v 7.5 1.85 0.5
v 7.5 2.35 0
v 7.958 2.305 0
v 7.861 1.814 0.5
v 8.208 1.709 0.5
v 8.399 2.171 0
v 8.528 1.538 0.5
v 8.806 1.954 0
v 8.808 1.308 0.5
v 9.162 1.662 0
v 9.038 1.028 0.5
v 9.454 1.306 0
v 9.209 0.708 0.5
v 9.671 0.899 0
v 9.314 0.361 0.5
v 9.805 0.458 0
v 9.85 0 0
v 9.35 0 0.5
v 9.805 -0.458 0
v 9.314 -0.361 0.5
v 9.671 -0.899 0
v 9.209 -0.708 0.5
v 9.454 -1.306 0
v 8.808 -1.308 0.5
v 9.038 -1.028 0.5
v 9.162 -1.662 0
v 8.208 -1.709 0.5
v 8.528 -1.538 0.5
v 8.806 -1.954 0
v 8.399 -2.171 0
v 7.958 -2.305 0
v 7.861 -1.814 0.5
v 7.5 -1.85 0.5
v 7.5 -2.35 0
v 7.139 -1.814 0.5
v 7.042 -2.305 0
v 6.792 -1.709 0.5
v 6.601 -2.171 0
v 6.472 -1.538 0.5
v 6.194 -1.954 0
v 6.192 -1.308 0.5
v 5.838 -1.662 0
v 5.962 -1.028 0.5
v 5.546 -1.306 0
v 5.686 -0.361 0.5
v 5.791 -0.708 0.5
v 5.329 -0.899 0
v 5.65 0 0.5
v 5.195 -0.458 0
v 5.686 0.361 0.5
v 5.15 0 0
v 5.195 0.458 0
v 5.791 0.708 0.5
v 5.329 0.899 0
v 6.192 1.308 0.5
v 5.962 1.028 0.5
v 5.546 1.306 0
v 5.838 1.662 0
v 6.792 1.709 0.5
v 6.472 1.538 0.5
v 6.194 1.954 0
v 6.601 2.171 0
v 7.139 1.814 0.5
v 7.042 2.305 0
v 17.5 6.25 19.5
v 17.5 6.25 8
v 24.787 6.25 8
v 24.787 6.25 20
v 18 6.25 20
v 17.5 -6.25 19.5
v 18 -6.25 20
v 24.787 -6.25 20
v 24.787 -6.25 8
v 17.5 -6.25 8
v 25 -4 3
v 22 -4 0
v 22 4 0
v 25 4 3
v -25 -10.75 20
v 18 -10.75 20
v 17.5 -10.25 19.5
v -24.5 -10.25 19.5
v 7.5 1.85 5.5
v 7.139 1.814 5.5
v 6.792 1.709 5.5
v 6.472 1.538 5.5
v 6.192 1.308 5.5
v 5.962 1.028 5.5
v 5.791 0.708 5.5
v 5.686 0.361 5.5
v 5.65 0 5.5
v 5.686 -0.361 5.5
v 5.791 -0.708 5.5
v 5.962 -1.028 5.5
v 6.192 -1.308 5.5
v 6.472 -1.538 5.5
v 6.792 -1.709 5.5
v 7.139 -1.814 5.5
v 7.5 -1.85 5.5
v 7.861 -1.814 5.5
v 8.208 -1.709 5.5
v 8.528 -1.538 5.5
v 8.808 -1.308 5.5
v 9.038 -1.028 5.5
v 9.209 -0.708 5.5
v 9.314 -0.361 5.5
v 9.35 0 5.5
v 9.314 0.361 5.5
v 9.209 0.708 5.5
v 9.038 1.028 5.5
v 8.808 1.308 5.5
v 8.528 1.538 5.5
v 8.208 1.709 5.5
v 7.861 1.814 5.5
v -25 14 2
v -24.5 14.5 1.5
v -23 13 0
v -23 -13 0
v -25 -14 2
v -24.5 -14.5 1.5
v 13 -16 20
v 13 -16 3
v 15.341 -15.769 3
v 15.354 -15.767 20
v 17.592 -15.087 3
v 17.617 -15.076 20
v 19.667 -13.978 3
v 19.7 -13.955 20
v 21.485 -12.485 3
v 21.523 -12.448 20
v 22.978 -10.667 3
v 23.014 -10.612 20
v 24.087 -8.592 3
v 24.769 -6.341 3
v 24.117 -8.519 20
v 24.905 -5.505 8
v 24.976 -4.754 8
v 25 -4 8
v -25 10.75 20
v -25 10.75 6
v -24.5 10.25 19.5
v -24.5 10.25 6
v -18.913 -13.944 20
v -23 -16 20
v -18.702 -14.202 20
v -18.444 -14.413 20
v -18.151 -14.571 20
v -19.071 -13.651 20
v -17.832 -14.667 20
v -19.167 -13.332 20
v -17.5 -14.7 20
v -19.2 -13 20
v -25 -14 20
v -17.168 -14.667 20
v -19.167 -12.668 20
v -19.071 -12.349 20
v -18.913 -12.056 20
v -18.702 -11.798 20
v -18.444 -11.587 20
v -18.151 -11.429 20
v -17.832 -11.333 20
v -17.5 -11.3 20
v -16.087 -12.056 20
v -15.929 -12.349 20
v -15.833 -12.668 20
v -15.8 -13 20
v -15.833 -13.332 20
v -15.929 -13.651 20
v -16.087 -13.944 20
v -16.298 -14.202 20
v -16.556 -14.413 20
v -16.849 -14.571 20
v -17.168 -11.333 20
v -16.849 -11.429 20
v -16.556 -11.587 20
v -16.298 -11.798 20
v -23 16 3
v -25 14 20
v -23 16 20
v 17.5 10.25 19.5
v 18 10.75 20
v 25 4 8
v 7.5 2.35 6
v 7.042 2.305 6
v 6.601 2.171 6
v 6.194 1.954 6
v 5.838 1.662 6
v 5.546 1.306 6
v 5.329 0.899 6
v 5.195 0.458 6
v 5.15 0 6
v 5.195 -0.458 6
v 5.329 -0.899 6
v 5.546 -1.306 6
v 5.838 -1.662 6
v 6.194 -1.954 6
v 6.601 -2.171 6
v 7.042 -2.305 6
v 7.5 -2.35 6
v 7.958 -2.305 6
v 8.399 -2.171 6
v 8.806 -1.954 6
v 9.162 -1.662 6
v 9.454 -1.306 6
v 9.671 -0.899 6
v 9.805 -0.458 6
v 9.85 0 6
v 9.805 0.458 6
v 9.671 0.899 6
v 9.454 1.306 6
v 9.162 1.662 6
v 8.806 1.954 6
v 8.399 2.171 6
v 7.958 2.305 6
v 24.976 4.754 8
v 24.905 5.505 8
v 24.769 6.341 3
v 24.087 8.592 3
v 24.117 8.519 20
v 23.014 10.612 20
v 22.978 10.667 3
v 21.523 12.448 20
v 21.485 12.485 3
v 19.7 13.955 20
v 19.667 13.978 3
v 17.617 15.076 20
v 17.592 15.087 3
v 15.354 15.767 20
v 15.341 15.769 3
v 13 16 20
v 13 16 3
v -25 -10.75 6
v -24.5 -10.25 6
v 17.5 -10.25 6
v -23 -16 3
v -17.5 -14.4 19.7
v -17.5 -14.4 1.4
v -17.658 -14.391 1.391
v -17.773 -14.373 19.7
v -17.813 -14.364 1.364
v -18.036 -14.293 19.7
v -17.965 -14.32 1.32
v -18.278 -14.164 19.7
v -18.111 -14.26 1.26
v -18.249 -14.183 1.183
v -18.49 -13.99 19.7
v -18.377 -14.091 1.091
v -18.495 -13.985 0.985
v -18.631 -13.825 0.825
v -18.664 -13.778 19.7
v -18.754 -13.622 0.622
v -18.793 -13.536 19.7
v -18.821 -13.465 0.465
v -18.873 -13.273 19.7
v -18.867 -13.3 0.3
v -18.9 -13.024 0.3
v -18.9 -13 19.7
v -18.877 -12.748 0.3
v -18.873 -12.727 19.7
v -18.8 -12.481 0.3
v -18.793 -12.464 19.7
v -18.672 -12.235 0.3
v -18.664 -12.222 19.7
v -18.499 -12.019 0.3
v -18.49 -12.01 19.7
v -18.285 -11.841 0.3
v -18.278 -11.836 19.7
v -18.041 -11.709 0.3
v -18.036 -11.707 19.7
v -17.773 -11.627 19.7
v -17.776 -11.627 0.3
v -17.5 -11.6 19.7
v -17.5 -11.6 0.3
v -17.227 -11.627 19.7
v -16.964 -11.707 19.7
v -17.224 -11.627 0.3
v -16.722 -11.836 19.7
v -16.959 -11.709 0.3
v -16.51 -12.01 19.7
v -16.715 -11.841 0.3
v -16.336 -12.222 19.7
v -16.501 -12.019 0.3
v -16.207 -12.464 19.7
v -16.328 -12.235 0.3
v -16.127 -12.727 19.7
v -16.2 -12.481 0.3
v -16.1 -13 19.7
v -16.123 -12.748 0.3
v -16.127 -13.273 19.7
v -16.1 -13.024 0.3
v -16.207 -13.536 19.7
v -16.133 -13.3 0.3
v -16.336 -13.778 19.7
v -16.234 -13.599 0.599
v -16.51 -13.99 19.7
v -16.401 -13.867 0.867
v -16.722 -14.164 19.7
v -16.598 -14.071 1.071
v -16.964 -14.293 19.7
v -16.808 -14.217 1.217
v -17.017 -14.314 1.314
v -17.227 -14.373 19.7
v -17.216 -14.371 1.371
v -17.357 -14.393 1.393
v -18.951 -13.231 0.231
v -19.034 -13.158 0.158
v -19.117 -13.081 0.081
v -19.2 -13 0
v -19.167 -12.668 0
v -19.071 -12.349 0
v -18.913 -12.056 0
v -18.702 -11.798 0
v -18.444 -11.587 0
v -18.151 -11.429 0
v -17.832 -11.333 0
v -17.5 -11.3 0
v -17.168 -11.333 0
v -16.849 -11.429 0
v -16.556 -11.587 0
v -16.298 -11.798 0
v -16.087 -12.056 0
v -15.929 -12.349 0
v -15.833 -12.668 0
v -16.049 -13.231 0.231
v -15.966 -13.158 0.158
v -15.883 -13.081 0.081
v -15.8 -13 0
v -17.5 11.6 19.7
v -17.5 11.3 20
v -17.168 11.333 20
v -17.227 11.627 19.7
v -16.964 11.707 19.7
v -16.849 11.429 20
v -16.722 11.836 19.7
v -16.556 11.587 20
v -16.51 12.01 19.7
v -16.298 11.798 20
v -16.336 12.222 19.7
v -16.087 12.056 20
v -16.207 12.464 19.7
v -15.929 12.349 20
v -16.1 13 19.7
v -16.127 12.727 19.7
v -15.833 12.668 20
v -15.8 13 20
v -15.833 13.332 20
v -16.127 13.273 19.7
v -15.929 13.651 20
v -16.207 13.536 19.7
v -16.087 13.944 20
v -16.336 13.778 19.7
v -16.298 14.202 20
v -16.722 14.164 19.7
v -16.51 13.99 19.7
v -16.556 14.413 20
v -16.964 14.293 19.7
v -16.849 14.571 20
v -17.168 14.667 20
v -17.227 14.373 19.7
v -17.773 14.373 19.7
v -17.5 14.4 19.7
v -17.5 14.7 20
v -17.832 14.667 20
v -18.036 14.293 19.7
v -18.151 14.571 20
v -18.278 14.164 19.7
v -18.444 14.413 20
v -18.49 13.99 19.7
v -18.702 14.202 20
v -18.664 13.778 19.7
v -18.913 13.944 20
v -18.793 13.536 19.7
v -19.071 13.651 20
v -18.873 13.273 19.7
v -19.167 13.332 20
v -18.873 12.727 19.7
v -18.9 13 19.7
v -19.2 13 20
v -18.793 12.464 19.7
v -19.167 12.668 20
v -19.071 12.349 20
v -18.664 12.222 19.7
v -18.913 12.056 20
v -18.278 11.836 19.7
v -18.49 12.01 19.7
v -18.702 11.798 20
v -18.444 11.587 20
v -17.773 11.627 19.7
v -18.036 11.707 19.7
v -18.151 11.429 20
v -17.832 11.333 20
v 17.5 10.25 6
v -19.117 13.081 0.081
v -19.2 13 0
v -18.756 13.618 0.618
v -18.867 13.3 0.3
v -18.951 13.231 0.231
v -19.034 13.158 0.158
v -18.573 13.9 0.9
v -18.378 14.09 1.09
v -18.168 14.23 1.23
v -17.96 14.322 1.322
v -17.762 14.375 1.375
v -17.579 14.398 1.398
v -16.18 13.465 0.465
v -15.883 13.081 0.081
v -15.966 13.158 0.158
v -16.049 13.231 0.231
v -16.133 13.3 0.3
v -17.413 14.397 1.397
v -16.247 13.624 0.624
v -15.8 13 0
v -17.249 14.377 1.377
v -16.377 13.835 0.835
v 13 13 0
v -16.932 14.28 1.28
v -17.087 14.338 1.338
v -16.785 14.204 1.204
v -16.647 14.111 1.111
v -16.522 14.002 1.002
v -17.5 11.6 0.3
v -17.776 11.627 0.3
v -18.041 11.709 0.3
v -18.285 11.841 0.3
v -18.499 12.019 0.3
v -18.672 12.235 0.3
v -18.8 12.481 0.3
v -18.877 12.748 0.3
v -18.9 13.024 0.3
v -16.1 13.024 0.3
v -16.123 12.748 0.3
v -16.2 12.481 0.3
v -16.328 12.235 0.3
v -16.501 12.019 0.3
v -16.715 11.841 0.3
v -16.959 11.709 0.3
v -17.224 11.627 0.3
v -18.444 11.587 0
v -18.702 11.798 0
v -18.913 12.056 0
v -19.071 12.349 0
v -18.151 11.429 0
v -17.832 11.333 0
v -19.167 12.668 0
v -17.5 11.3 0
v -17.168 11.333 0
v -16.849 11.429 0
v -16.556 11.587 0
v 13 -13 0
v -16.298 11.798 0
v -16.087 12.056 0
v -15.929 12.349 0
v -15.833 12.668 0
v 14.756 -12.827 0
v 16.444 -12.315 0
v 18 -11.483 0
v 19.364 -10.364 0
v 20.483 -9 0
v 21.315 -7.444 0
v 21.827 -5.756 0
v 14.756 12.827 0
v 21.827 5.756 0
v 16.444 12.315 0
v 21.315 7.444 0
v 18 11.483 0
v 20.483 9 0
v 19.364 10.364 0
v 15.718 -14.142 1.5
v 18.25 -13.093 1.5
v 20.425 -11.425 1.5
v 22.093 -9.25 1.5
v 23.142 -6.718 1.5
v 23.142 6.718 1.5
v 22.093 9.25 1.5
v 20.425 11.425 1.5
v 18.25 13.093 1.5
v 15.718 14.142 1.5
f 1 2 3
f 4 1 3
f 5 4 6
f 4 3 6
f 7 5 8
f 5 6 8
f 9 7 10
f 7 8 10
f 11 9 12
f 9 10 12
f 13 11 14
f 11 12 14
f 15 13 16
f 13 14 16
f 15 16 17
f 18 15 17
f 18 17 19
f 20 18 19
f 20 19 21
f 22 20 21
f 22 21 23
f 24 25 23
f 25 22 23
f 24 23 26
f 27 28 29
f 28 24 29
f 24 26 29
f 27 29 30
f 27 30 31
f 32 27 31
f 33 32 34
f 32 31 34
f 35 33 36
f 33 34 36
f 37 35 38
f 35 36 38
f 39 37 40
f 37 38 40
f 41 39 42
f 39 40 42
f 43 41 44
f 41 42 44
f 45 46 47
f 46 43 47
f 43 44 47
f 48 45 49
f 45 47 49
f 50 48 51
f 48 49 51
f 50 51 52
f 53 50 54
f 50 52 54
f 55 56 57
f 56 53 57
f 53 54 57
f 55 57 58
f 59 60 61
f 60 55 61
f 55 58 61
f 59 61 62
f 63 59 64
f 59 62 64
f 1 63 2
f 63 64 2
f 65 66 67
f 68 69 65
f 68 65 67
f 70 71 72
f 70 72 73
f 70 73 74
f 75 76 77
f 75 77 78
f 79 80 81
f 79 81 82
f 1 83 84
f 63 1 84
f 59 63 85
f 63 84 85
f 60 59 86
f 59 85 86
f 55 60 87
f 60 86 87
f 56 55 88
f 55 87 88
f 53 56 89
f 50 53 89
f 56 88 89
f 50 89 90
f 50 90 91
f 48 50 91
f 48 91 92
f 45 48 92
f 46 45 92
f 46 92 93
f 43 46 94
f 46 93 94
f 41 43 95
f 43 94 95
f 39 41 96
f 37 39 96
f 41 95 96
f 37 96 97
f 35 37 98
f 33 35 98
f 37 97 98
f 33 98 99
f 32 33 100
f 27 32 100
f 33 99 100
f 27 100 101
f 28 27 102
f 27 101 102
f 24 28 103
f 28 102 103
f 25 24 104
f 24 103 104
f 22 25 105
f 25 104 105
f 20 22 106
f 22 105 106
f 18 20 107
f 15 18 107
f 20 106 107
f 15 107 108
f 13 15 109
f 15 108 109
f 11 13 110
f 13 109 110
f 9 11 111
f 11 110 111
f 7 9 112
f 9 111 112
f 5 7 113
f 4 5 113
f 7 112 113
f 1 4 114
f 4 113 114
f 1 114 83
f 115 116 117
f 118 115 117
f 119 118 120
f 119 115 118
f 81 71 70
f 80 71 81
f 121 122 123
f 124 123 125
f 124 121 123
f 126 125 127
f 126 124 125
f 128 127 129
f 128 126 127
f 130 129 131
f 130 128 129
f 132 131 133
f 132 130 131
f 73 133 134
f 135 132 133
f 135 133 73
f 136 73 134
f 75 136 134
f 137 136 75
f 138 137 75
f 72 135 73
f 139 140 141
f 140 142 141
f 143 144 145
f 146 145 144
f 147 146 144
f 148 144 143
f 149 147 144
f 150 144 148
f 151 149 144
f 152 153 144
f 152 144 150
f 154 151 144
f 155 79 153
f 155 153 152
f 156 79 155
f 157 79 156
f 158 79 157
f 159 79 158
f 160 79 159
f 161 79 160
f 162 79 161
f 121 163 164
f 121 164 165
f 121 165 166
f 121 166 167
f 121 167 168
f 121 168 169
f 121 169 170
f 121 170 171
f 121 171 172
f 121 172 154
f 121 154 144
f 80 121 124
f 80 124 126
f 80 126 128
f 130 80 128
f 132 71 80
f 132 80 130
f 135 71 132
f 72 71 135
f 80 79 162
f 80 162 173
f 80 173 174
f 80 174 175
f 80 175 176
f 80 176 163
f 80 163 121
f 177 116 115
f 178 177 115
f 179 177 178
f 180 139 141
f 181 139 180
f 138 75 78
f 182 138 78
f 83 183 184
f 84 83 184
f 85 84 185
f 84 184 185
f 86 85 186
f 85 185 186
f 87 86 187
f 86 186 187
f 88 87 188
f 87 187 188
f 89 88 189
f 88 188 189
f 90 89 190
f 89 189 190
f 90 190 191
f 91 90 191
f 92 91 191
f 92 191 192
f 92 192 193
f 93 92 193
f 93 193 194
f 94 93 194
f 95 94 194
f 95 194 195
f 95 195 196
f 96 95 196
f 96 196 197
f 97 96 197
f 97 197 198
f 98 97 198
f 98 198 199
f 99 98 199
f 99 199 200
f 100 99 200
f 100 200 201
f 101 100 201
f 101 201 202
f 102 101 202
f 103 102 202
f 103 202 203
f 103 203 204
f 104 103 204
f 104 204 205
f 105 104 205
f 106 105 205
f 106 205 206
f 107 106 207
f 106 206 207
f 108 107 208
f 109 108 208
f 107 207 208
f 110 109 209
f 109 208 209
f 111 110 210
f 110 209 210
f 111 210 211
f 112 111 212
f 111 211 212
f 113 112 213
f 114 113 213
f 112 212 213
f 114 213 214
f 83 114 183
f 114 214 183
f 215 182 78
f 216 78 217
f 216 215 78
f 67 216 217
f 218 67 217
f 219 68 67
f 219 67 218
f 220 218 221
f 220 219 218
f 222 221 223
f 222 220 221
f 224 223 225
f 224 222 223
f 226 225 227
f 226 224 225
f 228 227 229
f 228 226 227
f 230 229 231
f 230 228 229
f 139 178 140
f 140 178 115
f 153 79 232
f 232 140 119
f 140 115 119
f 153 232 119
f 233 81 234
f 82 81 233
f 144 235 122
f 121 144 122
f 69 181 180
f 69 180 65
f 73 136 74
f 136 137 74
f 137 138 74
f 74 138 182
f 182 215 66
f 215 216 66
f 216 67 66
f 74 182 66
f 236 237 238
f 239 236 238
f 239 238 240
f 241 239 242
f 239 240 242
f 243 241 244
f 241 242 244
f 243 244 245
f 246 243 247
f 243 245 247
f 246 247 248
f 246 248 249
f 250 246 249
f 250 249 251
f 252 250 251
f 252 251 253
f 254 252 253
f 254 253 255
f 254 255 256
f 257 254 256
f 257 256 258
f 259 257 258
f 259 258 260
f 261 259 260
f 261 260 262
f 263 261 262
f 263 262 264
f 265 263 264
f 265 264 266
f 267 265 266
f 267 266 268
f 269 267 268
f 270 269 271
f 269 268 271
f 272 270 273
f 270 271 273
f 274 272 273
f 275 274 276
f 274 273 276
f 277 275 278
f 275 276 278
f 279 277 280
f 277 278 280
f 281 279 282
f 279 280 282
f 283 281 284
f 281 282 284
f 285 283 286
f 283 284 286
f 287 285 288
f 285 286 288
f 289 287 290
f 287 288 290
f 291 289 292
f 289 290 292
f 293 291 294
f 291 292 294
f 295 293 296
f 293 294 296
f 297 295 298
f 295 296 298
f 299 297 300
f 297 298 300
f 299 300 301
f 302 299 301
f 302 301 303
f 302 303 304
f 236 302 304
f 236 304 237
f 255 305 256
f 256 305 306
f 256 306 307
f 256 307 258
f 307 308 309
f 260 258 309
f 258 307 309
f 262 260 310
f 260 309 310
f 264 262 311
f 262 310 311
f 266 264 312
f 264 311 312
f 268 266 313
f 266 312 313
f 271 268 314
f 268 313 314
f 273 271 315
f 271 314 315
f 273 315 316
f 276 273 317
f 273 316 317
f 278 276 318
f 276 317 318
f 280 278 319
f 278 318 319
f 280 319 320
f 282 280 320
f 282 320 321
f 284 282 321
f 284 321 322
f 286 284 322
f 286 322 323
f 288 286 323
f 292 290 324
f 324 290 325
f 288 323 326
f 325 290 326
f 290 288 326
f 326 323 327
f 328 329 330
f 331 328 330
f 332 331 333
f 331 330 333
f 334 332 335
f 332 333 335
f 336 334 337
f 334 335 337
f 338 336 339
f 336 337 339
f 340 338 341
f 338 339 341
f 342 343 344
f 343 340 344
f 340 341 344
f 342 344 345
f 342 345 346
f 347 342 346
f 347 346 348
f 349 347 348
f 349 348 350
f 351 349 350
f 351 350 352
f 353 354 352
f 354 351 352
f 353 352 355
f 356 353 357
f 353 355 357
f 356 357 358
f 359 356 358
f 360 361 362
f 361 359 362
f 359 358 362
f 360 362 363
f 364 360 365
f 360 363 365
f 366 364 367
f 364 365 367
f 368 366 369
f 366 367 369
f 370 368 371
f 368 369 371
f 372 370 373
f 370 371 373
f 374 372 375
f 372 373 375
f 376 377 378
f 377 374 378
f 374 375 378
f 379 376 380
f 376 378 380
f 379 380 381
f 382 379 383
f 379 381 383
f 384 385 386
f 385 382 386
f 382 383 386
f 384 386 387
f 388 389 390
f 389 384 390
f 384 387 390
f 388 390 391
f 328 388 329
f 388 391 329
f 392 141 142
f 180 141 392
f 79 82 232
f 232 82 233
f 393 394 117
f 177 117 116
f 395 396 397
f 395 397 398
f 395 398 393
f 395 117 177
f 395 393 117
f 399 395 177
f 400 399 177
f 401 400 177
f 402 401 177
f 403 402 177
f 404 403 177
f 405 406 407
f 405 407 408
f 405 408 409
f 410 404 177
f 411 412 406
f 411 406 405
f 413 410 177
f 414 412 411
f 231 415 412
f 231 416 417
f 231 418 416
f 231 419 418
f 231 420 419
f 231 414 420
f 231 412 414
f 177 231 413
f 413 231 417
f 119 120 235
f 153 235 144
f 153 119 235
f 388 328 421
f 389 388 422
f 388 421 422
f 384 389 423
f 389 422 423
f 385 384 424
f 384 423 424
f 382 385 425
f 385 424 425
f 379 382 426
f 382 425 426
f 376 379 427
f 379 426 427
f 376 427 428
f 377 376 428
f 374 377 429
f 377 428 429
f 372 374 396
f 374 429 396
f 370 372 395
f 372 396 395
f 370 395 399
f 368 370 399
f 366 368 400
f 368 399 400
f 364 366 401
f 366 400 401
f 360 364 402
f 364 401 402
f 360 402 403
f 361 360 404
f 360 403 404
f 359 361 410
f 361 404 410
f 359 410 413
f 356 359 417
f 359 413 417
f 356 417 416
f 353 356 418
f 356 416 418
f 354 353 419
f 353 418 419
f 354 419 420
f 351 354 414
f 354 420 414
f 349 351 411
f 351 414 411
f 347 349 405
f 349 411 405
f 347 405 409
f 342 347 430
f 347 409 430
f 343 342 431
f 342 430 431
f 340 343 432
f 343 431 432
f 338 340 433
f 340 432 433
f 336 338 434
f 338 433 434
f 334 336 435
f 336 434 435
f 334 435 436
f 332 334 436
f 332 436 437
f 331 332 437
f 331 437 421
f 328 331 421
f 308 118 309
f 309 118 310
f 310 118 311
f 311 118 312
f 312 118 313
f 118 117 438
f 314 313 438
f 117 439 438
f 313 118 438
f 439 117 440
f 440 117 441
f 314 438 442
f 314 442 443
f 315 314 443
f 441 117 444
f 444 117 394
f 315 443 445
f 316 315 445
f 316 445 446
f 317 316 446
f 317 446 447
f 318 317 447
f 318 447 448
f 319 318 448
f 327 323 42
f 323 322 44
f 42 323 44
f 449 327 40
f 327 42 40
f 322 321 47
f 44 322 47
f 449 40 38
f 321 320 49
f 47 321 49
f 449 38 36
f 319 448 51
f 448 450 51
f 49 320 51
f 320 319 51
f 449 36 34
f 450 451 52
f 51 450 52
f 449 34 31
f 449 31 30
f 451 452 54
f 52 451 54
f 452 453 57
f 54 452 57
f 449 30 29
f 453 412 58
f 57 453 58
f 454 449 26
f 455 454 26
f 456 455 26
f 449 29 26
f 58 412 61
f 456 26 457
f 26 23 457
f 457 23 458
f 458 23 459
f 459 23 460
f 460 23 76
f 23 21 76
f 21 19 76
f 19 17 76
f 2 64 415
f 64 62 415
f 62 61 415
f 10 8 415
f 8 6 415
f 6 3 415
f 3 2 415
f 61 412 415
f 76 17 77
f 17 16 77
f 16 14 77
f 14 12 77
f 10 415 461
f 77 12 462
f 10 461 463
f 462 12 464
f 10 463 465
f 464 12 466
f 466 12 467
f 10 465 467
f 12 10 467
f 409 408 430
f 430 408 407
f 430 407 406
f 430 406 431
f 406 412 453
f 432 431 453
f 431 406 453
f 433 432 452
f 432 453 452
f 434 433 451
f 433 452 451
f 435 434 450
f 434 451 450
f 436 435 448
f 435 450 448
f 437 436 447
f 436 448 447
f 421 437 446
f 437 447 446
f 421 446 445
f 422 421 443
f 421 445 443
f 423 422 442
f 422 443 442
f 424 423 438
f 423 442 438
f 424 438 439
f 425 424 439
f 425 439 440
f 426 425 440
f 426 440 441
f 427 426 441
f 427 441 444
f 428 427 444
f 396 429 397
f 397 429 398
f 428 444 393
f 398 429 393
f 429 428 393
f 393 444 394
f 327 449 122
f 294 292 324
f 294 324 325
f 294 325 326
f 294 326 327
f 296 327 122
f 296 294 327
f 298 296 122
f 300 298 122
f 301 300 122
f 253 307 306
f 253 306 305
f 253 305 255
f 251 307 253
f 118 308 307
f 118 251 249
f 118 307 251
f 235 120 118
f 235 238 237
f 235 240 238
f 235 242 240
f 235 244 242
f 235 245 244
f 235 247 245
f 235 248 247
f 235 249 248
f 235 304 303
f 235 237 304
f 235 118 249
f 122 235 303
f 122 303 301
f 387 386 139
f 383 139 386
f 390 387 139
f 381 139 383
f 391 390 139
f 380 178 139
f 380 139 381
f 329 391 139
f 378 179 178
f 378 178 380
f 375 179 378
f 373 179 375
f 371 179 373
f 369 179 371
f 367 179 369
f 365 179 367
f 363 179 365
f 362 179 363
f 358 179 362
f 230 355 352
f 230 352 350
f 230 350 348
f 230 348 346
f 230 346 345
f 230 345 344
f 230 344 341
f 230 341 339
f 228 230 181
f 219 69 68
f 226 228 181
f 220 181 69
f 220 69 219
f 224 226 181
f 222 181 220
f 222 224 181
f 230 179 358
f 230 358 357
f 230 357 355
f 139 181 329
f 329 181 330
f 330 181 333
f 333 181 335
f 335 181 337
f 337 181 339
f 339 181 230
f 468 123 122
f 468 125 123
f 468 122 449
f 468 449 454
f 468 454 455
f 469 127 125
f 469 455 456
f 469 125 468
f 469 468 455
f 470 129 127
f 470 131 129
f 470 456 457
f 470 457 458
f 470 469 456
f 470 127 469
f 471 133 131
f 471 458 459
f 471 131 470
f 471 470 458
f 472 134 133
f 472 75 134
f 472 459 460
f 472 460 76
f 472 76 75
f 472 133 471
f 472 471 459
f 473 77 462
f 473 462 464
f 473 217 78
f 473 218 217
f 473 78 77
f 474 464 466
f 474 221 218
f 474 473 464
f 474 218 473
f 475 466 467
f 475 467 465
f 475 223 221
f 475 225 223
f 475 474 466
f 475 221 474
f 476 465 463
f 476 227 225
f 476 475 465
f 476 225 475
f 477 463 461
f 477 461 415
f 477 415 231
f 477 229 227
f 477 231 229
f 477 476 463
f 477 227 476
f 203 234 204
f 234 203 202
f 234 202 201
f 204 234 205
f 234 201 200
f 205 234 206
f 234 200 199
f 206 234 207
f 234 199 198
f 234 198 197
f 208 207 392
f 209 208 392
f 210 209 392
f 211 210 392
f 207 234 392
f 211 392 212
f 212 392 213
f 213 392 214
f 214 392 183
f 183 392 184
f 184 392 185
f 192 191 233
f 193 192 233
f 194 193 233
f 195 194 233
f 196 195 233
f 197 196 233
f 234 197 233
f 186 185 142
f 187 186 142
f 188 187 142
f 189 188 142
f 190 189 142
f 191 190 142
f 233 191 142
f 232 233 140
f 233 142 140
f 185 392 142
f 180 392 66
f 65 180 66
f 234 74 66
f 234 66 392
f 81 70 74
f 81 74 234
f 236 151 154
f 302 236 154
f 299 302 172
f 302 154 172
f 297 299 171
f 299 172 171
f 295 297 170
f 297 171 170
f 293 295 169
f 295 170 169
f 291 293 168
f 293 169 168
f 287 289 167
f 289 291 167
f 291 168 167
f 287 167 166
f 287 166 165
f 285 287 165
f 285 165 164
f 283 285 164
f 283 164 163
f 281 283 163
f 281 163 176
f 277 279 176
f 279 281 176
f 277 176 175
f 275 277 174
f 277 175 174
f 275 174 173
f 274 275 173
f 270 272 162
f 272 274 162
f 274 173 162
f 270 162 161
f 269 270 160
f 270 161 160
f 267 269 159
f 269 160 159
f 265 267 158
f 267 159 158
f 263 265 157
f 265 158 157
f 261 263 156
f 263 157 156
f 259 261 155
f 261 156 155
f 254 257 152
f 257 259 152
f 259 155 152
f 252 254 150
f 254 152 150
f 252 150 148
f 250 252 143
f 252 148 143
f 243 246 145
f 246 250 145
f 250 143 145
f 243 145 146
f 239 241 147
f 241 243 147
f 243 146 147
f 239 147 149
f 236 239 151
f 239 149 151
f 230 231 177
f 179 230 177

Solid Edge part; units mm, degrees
sketch "Sketch1" plane through (0, 0, 0) normal (0, 0, 1) x (1, 0, 0)
  line L0 (-25, -16) -> (25, -16)
  line L1 (25, -16) -> (25, 16)
  line L2 (25, 16) -> (-25, 16)
  line L3 (-25, 16) -> (-25, -16)
  dimension "D1" = 32
  dimension "D2" = 50
extrude "Protrusion1" add sketch "Sketch1" along normal blind 20
sketch "Sketch2" plane through (0, 0, 20) normal (0, 0, 1) x (0, 1, 0)
  line L0 (-10.25, 25) -> (10.25, 25)
  line L1 (10.25, 25) -> (10.25, -17.5)
  line L2 (10.25, -17.5) -> (-10.25, -17.5)
  line L3 (-10.25, -17.5) -> (-10.25, 25)
  dimension "D1" = 20.5
  dimension "D2" = 42.5
extrude "servo_cutout" cut sketch "Sketch2" against normal blind 14
hole "screw_bearing" at (7.5, 0, 0) direction (0, 0, 1) diameter 3.7 depth 30 tip angle 118 start chamfer 0.5 start chamfer angle 45 end chamfer 0.5 end chamfer angle 45
chamfer "Chamfer1" distance 0.5 angle 45 5 edges at (-3.75, -10.25, 20) (-25, -10.25, 13) (17.5, 0, 20) (-3.75, 10.25, 20) (-25, 10.25, 13)
hole "Hole1" at (-17.5, 13, 20) direction (0, 0, -1) diameter 2.8 depth 30 tip angle 118 start chamfer 0.3 start chamfer angle 45 end chamfer 0.3 end chamfer angle 45
hole "Hole2" at (-17.5, -13, 20) direction (0, 0, -1) diameter 2.8 depth 30 tip angle 118 start chamfer 0.3 start chamfer angle 45 end chamfer 0.3 end chamfer angle 45
chamfer "Chamfer2" distance 2 angle 45 3 edges at (-25, 0, 0) (-25, 16, 10) (-25, -16, 10)
fillet "Round1" radius 12 2 edges at (25, 16, 10) (25, -16, 10)
sketch "Sketch3" plane through (0, 0, 20) normal (0, 0, 1) x (0, 1, 0)
  line L0 (-6.25, 0) -> (6.25, 0)
  line L1 (6.25, 0) -> (6.25, -25)
  line L2 (6.25, -25) -> (-6.25, -25)
  line L3 (-6.25, -25) -> (-6.25, 0)
  dimension "D1" = 12.5
  dimension "D2" = 25
extrude "cable_cutout" cut sketch "Sketch3" against normal blind 12
chamfer "bottom_chamfer" distance 3 angle 45 5 edges at (21.4853, 12.4853, 0) (25, 0, 0) (21.4853, -12.4853, 0) (-5, -16, 0) (-5, 16, 0)
properties material "Polypropylene, general purpose"
